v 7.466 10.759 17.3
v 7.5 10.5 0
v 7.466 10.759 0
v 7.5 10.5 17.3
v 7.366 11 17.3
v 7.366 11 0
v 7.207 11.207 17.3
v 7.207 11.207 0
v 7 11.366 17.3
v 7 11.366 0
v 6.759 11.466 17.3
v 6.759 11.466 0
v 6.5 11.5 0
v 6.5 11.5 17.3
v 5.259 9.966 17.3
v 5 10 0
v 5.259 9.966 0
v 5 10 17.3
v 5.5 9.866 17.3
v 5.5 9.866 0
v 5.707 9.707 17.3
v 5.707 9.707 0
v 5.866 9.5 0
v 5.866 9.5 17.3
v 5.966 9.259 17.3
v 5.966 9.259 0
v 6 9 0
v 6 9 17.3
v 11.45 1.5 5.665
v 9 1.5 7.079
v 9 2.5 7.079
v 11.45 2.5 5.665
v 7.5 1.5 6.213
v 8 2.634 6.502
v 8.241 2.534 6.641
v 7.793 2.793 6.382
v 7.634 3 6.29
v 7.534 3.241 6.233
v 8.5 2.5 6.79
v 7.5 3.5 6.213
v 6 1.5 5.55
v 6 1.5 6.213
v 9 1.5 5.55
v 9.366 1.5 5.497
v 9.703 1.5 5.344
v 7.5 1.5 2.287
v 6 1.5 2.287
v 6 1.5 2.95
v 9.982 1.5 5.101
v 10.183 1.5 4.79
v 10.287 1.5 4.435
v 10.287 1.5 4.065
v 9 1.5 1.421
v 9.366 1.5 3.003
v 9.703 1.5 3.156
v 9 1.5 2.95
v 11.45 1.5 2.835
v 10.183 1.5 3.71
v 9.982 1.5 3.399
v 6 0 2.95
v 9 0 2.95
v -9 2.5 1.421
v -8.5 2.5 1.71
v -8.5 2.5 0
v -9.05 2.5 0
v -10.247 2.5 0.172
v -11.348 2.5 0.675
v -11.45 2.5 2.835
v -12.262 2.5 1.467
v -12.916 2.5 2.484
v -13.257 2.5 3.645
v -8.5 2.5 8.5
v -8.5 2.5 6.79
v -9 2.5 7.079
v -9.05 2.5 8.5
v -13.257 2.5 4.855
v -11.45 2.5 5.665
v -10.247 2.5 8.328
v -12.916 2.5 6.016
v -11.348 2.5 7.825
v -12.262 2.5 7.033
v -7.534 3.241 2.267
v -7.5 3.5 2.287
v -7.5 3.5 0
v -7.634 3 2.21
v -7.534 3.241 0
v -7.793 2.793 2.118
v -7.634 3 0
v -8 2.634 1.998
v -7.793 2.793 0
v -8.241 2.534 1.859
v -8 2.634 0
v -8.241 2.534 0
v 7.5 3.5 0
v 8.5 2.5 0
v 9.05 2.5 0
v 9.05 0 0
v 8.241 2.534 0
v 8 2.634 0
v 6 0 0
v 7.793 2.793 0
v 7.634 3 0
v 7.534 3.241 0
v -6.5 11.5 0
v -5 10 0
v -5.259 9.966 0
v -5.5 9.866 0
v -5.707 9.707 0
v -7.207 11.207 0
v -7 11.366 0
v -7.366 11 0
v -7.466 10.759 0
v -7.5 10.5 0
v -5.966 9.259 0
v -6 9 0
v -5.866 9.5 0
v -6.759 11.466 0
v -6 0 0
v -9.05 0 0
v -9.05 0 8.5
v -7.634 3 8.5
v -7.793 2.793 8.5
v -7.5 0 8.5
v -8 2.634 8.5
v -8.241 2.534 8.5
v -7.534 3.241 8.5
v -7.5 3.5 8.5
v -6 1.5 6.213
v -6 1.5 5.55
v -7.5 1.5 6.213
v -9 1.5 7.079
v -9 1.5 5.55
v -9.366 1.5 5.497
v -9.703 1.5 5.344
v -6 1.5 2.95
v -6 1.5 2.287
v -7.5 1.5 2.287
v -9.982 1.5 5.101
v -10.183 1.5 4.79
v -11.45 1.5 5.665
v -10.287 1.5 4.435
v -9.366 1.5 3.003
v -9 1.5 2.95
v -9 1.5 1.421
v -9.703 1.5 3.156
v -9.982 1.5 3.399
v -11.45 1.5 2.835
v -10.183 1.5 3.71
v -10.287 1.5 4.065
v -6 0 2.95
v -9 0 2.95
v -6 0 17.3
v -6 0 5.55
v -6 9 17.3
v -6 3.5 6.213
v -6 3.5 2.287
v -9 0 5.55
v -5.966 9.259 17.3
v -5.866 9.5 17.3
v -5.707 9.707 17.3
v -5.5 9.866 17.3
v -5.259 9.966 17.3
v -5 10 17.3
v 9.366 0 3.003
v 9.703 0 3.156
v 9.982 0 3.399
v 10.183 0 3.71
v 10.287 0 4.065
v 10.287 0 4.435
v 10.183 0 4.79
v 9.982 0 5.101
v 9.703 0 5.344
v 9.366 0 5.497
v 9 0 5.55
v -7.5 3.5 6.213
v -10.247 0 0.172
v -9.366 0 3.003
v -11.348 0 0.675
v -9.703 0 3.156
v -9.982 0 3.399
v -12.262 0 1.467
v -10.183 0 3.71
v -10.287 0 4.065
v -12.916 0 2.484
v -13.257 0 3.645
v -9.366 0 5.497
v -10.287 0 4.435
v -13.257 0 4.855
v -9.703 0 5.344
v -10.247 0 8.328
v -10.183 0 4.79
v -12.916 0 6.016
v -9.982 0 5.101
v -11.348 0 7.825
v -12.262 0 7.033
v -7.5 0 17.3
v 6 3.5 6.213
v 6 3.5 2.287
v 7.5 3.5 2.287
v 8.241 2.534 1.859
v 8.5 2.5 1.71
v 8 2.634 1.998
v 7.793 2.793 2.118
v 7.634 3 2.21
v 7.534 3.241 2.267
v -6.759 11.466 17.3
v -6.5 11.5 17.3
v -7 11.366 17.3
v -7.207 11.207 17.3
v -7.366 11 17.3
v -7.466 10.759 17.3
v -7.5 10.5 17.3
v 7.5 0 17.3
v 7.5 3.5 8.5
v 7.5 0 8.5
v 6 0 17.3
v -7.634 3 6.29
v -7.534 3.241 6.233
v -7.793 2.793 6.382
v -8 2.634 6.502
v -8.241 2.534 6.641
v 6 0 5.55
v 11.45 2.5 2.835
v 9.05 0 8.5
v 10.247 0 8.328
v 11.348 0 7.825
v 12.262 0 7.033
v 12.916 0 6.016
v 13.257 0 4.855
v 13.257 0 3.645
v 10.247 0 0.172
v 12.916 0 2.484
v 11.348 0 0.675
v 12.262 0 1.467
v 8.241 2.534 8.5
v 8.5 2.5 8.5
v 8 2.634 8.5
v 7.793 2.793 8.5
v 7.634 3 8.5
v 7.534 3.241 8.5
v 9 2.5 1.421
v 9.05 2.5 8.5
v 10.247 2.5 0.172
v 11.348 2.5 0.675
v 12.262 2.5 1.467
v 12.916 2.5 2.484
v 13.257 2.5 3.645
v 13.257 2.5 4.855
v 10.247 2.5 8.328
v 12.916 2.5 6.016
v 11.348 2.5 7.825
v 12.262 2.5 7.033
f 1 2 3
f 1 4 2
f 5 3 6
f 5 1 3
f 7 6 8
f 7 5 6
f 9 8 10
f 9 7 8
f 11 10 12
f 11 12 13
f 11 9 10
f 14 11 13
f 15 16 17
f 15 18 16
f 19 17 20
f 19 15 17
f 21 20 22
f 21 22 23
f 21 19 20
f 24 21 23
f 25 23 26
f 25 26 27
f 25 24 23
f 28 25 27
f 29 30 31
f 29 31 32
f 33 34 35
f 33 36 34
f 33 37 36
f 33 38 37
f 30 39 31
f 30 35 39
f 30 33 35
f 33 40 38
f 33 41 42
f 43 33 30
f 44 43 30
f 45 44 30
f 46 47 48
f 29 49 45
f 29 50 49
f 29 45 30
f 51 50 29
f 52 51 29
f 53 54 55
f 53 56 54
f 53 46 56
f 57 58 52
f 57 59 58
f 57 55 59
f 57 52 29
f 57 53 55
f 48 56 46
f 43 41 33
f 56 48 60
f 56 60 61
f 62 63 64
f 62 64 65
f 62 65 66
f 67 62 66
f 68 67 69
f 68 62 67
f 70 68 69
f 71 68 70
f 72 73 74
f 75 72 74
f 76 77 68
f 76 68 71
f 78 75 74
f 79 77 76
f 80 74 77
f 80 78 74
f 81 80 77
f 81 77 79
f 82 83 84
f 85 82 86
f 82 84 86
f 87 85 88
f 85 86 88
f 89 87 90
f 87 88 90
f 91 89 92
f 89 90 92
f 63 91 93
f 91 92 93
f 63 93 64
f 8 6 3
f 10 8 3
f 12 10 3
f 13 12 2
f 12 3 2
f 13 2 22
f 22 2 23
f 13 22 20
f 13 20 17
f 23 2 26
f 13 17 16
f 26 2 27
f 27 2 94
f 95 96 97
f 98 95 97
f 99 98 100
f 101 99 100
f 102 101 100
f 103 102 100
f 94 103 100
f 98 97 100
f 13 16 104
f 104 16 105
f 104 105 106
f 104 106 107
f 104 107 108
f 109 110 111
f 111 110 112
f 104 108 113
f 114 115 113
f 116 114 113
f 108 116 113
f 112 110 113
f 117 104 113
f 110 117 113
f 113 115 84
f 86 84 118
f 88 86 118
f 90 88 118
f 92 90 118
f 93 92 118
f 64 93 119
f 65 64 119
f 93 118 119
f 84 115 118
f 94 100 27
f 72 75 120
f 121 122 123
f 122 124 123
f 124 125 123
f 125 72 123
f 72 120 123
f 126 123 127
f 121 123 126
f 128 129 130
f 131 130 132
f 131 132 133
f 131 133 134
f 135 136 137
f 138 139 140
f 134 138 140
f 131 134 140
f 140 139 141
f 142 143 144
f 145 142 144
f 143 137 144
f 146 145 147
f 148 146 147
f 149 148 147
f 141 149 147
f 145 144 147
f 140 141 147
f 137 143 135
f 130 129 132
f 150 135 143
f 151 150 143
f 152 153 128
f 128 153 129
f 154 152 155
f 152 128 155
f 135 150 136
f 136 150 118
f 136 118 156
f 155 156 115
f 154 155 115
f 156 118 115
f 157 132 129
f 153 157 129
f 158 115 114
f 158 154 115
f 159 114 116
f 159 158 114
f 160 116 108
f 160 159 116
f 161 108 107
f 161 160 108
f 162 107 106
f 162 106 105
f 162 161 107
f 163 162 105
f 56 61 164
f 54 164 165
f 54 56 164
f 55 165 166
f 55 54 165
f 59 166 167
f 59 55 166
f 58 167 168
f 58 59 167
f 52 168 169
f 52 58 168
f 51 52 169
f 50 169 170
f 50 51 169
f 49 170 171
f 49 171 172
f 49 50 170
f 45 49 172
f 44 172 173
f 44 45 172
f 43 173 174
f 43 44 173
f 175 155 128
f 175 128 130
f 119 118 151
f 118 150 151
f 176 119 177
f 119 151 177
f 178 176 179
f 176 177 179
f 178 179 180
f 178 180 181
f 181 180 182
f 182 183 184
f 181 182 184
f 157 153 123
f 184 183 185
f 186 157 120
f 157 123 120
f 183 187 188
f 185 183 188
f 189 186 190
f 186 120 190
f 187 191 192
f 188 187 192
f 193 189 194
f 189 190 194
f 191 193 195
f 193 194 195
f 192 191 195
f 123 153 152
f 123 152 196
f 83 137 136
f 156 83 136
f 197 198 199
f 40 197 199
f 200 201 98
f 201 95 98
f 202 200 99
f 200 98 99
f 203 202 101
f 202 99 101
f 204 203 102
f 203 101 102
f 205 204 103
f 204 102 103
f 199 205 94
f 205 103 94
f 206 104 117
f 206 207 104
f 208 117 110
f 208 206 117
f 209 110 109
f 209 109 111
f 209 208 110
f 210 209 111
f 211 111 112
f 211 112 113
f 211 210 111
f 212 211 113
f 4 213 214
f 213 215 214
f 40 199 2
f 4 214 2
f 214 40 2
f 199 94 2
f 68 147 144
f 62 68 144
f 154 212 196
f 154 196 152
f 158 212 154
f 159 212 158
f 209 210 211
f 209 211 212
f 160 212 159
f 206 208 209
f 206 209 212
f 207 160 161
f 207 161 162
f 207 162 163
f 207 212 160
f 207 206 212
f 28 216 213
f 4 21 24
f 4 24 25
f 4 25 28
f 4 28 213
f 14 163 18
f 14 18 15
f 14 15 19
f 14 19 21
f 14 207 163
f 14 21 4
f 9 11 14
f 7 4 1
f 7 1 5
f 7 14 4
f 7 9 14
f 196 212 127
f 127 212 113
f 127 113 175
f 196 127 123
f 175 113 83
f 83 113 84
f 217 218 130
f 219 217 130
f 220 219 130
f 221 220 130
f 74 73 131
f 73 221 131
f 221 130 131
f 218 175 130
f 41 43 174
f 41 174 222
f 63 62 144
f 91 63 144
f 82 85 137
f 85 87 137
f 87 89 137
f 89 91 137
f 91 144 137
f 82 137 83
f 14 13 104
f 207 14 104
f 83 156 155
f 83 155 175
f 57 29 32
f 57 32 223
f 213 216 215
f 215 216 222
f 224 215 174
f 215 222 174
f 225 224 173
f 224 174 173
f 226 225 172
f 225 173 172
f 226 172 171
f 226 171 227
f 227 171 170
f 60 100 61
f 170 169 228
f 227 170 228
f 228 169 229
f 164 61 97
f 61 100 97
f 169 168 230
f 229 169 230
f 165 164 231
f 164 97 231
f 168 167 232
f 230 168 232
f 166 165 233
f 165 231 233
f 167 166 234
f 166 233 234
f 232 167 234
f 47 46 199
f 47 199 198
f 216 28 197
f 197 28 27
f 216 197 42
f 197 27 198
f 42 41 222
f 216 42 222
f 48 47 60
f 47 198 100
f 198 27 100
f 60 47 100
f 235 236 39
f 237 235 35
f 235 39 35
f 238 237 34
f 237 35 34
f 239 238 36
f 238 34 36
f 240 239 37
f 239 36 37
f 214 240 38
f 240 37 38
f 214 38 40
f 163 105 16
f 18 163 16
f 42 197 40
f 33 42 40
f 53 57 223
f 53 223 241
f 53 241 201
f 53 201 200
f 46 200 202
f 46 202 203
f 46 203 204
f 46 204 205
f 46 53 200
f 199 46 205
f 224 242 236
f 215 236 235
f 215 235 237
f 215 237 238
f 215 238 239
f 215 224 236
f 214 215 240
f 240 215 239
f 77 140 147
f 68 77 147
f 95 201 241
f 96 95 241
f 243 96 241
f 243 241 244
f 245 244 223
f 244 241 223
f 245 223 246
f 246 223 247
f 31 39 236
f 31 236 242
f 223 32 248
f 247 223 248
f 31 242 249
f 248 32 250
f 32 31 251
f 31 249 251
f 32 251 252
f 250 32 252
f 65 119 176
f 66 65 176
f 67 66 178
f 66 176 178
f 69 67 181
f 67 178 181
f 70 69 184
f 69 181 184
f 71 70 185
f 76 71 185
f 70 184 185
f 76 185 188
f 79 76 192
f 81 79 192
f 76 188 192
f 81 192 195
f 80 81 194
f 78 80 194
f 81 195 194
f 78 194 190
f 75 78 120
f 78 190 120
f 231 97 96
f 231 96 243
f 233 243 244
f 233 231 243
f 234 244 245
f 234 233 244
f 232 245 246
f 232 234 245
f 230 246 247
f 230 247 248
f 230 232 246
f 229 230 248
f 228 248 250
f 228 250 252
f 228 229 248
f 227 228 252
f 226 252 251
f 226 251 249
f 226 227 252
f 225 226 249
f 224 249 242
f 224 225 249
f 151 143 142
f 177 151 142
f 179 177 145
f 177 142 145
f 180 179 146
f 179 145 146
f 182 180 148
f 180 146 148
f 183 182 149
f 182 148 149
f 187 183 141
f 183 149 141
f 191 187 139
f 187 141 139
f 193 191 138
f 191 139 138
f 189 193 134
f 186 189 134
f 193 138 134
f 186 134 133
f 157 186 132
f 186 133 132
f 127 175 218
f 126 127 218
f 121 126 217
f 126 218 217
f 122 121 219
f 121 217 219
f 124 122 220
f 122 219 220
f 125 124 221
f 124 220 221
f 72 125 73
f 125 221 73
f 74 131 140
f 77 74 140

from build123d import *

# Parameters (mm, degrees)
BOSS_EXTRUDE1_DEPTH     = 17.3
BOSS_EXTRUDE2_DEPTH     = 2.5
CUT_EXTRUDE1_DEPTH      = 2.5
CUT_EXTRUDE2_DEPTH      = 1
CUT_EXTRUDE2_DEPTH_BACK = 1
FILLET1_R               = 1
FILLET2_R               = 1


with BuildPart() as part:
    # Sketch1 → Boss-Extrude1 (new body)
    with BuildSketch(Plane.XY):
        Polygon((6, 0), (7.5, 0), (7.5, 11.5), (-7.5, 11.5), (-7.5, 0), (-6, 0), (-6, 10), (6, 10), align=None)
    extrude(amount=BOSS_EXTRUDE1_DEPTH)

    # Sketch2 → Boss-Extrude2 (add)
    with BuildSketch(Plane.XZ):
        with BuildLine():
            Line((-7.5, 0), (-9.05, 0))
            ThreePointArc((-9.05, 0), (-13.3, 4.25), (-9.05, 8.5))
            Line((-9.05, 8.5), (-7.5, 8.5))
            Line((-7.5, 8.5), (-7.5, 0))
        make_face()
        with BuildLine():
            Line((7.5, 0), (9.05, 0))
            ThreePointArc((9.05, 0), (13.3, 4.25), (9.05, 8.5))
            Line((9.05, 8.5), (7.5, 8.5))
            Line((7.5, 8.5), (7.5, 0))
        make_face()
    extrude(amount=-BOSS_EXTRUDE2_DEPTH)

    # Sketch3 → Cut-Extrude1 (cut)
    with BuildSketch(Plane(origin=(0, 2.5, 0), x_dir=(1, 0, 0), z_dir=(0, 1, 0))):
        with BuildLine():
            Line((6, -2.95), (9, -2.95))
            ThreePointArc((9, -2.95), (10.3, -4.25), (9, -5.55))
            Line((9, -5.55), (6, -5.55))
            Line((6, -5.55), (6, -2.95))
        make_face()
        with BuildLine():
            Line((-6, -2.95), (-9, -2.95))
            ThreePointArc((-9, -2.95), (-10.3, -4.25), (-9, -5.55))
            Line((-9, -5.55), (-6, -5.55))
            Line((-6, -5.55), (-6, -2.95))
        make_face()
    extrude(amount=-CUT_EXTRUDE1_DEPTH, mode=Mode.SUBTRACT)

    # Sketch4 → Cut-Extrude2 (cut, two sides: drawn at the far end of the back side and taken through both)
    with BuildSketch(Plane(origin=(0, 2.5, 0), x_dir=(1, 0, 0), z_dir=(0, 1, 0)).offset(-CUT_EXTRUDE2_DEPTH_BACK)):
        Polygon((9, -1.420983681), (7.5, -2.287009085), (6, -2.287009085), (6, -6.212990915), (7.5, -6.212990915), (9, -7.079016319), (11.45, -5.66450816), (11.45, -2.83549184), align=None)
        Polygon((-6, -6.212990915), (-7.5, -6.212990915), (-9, -7.079016319), (-11.45, -5.66450816), (-11.45, -2.83549184), (-9, -1.420983681), (-7.5, -2.287009085), (-6, -2.287009085), align=None)
    extrude(amount=CUT_EXTRUDE2_DEPTH + CUT_EXTRUDE2_DEPTH_BACK, mode=Mode.SUBTRACT)

    # Fillet1
    fillet1_edges = [part.edges().sort_by_distance(p)[0] for p in [
        (6, 10, 8.65),
        (-6, 10, 8.65),
        (-7.5, 2.5, 1.143504542),
        (7.5, 2.5, 7.356495458),
        (7.5, 2.5, 1.143504542),
        (-7.5, 2.5, 7.356495458),
    ]]
    fillet(fillet1_edges, radius=FILLET1_R - 0.0001)  # a hair under: the kernel refuses the full size

    # Fillet2
    fillet2_edges = [part.edges().sort_by_distance(p)[0] for p in [
        (-7.5, 11.5, 8.65),
        (7.5, 11.5, 8.65),
    ]]
    fillet(fillet2_edges, radius=FILLET2_R)


solid = part.part
